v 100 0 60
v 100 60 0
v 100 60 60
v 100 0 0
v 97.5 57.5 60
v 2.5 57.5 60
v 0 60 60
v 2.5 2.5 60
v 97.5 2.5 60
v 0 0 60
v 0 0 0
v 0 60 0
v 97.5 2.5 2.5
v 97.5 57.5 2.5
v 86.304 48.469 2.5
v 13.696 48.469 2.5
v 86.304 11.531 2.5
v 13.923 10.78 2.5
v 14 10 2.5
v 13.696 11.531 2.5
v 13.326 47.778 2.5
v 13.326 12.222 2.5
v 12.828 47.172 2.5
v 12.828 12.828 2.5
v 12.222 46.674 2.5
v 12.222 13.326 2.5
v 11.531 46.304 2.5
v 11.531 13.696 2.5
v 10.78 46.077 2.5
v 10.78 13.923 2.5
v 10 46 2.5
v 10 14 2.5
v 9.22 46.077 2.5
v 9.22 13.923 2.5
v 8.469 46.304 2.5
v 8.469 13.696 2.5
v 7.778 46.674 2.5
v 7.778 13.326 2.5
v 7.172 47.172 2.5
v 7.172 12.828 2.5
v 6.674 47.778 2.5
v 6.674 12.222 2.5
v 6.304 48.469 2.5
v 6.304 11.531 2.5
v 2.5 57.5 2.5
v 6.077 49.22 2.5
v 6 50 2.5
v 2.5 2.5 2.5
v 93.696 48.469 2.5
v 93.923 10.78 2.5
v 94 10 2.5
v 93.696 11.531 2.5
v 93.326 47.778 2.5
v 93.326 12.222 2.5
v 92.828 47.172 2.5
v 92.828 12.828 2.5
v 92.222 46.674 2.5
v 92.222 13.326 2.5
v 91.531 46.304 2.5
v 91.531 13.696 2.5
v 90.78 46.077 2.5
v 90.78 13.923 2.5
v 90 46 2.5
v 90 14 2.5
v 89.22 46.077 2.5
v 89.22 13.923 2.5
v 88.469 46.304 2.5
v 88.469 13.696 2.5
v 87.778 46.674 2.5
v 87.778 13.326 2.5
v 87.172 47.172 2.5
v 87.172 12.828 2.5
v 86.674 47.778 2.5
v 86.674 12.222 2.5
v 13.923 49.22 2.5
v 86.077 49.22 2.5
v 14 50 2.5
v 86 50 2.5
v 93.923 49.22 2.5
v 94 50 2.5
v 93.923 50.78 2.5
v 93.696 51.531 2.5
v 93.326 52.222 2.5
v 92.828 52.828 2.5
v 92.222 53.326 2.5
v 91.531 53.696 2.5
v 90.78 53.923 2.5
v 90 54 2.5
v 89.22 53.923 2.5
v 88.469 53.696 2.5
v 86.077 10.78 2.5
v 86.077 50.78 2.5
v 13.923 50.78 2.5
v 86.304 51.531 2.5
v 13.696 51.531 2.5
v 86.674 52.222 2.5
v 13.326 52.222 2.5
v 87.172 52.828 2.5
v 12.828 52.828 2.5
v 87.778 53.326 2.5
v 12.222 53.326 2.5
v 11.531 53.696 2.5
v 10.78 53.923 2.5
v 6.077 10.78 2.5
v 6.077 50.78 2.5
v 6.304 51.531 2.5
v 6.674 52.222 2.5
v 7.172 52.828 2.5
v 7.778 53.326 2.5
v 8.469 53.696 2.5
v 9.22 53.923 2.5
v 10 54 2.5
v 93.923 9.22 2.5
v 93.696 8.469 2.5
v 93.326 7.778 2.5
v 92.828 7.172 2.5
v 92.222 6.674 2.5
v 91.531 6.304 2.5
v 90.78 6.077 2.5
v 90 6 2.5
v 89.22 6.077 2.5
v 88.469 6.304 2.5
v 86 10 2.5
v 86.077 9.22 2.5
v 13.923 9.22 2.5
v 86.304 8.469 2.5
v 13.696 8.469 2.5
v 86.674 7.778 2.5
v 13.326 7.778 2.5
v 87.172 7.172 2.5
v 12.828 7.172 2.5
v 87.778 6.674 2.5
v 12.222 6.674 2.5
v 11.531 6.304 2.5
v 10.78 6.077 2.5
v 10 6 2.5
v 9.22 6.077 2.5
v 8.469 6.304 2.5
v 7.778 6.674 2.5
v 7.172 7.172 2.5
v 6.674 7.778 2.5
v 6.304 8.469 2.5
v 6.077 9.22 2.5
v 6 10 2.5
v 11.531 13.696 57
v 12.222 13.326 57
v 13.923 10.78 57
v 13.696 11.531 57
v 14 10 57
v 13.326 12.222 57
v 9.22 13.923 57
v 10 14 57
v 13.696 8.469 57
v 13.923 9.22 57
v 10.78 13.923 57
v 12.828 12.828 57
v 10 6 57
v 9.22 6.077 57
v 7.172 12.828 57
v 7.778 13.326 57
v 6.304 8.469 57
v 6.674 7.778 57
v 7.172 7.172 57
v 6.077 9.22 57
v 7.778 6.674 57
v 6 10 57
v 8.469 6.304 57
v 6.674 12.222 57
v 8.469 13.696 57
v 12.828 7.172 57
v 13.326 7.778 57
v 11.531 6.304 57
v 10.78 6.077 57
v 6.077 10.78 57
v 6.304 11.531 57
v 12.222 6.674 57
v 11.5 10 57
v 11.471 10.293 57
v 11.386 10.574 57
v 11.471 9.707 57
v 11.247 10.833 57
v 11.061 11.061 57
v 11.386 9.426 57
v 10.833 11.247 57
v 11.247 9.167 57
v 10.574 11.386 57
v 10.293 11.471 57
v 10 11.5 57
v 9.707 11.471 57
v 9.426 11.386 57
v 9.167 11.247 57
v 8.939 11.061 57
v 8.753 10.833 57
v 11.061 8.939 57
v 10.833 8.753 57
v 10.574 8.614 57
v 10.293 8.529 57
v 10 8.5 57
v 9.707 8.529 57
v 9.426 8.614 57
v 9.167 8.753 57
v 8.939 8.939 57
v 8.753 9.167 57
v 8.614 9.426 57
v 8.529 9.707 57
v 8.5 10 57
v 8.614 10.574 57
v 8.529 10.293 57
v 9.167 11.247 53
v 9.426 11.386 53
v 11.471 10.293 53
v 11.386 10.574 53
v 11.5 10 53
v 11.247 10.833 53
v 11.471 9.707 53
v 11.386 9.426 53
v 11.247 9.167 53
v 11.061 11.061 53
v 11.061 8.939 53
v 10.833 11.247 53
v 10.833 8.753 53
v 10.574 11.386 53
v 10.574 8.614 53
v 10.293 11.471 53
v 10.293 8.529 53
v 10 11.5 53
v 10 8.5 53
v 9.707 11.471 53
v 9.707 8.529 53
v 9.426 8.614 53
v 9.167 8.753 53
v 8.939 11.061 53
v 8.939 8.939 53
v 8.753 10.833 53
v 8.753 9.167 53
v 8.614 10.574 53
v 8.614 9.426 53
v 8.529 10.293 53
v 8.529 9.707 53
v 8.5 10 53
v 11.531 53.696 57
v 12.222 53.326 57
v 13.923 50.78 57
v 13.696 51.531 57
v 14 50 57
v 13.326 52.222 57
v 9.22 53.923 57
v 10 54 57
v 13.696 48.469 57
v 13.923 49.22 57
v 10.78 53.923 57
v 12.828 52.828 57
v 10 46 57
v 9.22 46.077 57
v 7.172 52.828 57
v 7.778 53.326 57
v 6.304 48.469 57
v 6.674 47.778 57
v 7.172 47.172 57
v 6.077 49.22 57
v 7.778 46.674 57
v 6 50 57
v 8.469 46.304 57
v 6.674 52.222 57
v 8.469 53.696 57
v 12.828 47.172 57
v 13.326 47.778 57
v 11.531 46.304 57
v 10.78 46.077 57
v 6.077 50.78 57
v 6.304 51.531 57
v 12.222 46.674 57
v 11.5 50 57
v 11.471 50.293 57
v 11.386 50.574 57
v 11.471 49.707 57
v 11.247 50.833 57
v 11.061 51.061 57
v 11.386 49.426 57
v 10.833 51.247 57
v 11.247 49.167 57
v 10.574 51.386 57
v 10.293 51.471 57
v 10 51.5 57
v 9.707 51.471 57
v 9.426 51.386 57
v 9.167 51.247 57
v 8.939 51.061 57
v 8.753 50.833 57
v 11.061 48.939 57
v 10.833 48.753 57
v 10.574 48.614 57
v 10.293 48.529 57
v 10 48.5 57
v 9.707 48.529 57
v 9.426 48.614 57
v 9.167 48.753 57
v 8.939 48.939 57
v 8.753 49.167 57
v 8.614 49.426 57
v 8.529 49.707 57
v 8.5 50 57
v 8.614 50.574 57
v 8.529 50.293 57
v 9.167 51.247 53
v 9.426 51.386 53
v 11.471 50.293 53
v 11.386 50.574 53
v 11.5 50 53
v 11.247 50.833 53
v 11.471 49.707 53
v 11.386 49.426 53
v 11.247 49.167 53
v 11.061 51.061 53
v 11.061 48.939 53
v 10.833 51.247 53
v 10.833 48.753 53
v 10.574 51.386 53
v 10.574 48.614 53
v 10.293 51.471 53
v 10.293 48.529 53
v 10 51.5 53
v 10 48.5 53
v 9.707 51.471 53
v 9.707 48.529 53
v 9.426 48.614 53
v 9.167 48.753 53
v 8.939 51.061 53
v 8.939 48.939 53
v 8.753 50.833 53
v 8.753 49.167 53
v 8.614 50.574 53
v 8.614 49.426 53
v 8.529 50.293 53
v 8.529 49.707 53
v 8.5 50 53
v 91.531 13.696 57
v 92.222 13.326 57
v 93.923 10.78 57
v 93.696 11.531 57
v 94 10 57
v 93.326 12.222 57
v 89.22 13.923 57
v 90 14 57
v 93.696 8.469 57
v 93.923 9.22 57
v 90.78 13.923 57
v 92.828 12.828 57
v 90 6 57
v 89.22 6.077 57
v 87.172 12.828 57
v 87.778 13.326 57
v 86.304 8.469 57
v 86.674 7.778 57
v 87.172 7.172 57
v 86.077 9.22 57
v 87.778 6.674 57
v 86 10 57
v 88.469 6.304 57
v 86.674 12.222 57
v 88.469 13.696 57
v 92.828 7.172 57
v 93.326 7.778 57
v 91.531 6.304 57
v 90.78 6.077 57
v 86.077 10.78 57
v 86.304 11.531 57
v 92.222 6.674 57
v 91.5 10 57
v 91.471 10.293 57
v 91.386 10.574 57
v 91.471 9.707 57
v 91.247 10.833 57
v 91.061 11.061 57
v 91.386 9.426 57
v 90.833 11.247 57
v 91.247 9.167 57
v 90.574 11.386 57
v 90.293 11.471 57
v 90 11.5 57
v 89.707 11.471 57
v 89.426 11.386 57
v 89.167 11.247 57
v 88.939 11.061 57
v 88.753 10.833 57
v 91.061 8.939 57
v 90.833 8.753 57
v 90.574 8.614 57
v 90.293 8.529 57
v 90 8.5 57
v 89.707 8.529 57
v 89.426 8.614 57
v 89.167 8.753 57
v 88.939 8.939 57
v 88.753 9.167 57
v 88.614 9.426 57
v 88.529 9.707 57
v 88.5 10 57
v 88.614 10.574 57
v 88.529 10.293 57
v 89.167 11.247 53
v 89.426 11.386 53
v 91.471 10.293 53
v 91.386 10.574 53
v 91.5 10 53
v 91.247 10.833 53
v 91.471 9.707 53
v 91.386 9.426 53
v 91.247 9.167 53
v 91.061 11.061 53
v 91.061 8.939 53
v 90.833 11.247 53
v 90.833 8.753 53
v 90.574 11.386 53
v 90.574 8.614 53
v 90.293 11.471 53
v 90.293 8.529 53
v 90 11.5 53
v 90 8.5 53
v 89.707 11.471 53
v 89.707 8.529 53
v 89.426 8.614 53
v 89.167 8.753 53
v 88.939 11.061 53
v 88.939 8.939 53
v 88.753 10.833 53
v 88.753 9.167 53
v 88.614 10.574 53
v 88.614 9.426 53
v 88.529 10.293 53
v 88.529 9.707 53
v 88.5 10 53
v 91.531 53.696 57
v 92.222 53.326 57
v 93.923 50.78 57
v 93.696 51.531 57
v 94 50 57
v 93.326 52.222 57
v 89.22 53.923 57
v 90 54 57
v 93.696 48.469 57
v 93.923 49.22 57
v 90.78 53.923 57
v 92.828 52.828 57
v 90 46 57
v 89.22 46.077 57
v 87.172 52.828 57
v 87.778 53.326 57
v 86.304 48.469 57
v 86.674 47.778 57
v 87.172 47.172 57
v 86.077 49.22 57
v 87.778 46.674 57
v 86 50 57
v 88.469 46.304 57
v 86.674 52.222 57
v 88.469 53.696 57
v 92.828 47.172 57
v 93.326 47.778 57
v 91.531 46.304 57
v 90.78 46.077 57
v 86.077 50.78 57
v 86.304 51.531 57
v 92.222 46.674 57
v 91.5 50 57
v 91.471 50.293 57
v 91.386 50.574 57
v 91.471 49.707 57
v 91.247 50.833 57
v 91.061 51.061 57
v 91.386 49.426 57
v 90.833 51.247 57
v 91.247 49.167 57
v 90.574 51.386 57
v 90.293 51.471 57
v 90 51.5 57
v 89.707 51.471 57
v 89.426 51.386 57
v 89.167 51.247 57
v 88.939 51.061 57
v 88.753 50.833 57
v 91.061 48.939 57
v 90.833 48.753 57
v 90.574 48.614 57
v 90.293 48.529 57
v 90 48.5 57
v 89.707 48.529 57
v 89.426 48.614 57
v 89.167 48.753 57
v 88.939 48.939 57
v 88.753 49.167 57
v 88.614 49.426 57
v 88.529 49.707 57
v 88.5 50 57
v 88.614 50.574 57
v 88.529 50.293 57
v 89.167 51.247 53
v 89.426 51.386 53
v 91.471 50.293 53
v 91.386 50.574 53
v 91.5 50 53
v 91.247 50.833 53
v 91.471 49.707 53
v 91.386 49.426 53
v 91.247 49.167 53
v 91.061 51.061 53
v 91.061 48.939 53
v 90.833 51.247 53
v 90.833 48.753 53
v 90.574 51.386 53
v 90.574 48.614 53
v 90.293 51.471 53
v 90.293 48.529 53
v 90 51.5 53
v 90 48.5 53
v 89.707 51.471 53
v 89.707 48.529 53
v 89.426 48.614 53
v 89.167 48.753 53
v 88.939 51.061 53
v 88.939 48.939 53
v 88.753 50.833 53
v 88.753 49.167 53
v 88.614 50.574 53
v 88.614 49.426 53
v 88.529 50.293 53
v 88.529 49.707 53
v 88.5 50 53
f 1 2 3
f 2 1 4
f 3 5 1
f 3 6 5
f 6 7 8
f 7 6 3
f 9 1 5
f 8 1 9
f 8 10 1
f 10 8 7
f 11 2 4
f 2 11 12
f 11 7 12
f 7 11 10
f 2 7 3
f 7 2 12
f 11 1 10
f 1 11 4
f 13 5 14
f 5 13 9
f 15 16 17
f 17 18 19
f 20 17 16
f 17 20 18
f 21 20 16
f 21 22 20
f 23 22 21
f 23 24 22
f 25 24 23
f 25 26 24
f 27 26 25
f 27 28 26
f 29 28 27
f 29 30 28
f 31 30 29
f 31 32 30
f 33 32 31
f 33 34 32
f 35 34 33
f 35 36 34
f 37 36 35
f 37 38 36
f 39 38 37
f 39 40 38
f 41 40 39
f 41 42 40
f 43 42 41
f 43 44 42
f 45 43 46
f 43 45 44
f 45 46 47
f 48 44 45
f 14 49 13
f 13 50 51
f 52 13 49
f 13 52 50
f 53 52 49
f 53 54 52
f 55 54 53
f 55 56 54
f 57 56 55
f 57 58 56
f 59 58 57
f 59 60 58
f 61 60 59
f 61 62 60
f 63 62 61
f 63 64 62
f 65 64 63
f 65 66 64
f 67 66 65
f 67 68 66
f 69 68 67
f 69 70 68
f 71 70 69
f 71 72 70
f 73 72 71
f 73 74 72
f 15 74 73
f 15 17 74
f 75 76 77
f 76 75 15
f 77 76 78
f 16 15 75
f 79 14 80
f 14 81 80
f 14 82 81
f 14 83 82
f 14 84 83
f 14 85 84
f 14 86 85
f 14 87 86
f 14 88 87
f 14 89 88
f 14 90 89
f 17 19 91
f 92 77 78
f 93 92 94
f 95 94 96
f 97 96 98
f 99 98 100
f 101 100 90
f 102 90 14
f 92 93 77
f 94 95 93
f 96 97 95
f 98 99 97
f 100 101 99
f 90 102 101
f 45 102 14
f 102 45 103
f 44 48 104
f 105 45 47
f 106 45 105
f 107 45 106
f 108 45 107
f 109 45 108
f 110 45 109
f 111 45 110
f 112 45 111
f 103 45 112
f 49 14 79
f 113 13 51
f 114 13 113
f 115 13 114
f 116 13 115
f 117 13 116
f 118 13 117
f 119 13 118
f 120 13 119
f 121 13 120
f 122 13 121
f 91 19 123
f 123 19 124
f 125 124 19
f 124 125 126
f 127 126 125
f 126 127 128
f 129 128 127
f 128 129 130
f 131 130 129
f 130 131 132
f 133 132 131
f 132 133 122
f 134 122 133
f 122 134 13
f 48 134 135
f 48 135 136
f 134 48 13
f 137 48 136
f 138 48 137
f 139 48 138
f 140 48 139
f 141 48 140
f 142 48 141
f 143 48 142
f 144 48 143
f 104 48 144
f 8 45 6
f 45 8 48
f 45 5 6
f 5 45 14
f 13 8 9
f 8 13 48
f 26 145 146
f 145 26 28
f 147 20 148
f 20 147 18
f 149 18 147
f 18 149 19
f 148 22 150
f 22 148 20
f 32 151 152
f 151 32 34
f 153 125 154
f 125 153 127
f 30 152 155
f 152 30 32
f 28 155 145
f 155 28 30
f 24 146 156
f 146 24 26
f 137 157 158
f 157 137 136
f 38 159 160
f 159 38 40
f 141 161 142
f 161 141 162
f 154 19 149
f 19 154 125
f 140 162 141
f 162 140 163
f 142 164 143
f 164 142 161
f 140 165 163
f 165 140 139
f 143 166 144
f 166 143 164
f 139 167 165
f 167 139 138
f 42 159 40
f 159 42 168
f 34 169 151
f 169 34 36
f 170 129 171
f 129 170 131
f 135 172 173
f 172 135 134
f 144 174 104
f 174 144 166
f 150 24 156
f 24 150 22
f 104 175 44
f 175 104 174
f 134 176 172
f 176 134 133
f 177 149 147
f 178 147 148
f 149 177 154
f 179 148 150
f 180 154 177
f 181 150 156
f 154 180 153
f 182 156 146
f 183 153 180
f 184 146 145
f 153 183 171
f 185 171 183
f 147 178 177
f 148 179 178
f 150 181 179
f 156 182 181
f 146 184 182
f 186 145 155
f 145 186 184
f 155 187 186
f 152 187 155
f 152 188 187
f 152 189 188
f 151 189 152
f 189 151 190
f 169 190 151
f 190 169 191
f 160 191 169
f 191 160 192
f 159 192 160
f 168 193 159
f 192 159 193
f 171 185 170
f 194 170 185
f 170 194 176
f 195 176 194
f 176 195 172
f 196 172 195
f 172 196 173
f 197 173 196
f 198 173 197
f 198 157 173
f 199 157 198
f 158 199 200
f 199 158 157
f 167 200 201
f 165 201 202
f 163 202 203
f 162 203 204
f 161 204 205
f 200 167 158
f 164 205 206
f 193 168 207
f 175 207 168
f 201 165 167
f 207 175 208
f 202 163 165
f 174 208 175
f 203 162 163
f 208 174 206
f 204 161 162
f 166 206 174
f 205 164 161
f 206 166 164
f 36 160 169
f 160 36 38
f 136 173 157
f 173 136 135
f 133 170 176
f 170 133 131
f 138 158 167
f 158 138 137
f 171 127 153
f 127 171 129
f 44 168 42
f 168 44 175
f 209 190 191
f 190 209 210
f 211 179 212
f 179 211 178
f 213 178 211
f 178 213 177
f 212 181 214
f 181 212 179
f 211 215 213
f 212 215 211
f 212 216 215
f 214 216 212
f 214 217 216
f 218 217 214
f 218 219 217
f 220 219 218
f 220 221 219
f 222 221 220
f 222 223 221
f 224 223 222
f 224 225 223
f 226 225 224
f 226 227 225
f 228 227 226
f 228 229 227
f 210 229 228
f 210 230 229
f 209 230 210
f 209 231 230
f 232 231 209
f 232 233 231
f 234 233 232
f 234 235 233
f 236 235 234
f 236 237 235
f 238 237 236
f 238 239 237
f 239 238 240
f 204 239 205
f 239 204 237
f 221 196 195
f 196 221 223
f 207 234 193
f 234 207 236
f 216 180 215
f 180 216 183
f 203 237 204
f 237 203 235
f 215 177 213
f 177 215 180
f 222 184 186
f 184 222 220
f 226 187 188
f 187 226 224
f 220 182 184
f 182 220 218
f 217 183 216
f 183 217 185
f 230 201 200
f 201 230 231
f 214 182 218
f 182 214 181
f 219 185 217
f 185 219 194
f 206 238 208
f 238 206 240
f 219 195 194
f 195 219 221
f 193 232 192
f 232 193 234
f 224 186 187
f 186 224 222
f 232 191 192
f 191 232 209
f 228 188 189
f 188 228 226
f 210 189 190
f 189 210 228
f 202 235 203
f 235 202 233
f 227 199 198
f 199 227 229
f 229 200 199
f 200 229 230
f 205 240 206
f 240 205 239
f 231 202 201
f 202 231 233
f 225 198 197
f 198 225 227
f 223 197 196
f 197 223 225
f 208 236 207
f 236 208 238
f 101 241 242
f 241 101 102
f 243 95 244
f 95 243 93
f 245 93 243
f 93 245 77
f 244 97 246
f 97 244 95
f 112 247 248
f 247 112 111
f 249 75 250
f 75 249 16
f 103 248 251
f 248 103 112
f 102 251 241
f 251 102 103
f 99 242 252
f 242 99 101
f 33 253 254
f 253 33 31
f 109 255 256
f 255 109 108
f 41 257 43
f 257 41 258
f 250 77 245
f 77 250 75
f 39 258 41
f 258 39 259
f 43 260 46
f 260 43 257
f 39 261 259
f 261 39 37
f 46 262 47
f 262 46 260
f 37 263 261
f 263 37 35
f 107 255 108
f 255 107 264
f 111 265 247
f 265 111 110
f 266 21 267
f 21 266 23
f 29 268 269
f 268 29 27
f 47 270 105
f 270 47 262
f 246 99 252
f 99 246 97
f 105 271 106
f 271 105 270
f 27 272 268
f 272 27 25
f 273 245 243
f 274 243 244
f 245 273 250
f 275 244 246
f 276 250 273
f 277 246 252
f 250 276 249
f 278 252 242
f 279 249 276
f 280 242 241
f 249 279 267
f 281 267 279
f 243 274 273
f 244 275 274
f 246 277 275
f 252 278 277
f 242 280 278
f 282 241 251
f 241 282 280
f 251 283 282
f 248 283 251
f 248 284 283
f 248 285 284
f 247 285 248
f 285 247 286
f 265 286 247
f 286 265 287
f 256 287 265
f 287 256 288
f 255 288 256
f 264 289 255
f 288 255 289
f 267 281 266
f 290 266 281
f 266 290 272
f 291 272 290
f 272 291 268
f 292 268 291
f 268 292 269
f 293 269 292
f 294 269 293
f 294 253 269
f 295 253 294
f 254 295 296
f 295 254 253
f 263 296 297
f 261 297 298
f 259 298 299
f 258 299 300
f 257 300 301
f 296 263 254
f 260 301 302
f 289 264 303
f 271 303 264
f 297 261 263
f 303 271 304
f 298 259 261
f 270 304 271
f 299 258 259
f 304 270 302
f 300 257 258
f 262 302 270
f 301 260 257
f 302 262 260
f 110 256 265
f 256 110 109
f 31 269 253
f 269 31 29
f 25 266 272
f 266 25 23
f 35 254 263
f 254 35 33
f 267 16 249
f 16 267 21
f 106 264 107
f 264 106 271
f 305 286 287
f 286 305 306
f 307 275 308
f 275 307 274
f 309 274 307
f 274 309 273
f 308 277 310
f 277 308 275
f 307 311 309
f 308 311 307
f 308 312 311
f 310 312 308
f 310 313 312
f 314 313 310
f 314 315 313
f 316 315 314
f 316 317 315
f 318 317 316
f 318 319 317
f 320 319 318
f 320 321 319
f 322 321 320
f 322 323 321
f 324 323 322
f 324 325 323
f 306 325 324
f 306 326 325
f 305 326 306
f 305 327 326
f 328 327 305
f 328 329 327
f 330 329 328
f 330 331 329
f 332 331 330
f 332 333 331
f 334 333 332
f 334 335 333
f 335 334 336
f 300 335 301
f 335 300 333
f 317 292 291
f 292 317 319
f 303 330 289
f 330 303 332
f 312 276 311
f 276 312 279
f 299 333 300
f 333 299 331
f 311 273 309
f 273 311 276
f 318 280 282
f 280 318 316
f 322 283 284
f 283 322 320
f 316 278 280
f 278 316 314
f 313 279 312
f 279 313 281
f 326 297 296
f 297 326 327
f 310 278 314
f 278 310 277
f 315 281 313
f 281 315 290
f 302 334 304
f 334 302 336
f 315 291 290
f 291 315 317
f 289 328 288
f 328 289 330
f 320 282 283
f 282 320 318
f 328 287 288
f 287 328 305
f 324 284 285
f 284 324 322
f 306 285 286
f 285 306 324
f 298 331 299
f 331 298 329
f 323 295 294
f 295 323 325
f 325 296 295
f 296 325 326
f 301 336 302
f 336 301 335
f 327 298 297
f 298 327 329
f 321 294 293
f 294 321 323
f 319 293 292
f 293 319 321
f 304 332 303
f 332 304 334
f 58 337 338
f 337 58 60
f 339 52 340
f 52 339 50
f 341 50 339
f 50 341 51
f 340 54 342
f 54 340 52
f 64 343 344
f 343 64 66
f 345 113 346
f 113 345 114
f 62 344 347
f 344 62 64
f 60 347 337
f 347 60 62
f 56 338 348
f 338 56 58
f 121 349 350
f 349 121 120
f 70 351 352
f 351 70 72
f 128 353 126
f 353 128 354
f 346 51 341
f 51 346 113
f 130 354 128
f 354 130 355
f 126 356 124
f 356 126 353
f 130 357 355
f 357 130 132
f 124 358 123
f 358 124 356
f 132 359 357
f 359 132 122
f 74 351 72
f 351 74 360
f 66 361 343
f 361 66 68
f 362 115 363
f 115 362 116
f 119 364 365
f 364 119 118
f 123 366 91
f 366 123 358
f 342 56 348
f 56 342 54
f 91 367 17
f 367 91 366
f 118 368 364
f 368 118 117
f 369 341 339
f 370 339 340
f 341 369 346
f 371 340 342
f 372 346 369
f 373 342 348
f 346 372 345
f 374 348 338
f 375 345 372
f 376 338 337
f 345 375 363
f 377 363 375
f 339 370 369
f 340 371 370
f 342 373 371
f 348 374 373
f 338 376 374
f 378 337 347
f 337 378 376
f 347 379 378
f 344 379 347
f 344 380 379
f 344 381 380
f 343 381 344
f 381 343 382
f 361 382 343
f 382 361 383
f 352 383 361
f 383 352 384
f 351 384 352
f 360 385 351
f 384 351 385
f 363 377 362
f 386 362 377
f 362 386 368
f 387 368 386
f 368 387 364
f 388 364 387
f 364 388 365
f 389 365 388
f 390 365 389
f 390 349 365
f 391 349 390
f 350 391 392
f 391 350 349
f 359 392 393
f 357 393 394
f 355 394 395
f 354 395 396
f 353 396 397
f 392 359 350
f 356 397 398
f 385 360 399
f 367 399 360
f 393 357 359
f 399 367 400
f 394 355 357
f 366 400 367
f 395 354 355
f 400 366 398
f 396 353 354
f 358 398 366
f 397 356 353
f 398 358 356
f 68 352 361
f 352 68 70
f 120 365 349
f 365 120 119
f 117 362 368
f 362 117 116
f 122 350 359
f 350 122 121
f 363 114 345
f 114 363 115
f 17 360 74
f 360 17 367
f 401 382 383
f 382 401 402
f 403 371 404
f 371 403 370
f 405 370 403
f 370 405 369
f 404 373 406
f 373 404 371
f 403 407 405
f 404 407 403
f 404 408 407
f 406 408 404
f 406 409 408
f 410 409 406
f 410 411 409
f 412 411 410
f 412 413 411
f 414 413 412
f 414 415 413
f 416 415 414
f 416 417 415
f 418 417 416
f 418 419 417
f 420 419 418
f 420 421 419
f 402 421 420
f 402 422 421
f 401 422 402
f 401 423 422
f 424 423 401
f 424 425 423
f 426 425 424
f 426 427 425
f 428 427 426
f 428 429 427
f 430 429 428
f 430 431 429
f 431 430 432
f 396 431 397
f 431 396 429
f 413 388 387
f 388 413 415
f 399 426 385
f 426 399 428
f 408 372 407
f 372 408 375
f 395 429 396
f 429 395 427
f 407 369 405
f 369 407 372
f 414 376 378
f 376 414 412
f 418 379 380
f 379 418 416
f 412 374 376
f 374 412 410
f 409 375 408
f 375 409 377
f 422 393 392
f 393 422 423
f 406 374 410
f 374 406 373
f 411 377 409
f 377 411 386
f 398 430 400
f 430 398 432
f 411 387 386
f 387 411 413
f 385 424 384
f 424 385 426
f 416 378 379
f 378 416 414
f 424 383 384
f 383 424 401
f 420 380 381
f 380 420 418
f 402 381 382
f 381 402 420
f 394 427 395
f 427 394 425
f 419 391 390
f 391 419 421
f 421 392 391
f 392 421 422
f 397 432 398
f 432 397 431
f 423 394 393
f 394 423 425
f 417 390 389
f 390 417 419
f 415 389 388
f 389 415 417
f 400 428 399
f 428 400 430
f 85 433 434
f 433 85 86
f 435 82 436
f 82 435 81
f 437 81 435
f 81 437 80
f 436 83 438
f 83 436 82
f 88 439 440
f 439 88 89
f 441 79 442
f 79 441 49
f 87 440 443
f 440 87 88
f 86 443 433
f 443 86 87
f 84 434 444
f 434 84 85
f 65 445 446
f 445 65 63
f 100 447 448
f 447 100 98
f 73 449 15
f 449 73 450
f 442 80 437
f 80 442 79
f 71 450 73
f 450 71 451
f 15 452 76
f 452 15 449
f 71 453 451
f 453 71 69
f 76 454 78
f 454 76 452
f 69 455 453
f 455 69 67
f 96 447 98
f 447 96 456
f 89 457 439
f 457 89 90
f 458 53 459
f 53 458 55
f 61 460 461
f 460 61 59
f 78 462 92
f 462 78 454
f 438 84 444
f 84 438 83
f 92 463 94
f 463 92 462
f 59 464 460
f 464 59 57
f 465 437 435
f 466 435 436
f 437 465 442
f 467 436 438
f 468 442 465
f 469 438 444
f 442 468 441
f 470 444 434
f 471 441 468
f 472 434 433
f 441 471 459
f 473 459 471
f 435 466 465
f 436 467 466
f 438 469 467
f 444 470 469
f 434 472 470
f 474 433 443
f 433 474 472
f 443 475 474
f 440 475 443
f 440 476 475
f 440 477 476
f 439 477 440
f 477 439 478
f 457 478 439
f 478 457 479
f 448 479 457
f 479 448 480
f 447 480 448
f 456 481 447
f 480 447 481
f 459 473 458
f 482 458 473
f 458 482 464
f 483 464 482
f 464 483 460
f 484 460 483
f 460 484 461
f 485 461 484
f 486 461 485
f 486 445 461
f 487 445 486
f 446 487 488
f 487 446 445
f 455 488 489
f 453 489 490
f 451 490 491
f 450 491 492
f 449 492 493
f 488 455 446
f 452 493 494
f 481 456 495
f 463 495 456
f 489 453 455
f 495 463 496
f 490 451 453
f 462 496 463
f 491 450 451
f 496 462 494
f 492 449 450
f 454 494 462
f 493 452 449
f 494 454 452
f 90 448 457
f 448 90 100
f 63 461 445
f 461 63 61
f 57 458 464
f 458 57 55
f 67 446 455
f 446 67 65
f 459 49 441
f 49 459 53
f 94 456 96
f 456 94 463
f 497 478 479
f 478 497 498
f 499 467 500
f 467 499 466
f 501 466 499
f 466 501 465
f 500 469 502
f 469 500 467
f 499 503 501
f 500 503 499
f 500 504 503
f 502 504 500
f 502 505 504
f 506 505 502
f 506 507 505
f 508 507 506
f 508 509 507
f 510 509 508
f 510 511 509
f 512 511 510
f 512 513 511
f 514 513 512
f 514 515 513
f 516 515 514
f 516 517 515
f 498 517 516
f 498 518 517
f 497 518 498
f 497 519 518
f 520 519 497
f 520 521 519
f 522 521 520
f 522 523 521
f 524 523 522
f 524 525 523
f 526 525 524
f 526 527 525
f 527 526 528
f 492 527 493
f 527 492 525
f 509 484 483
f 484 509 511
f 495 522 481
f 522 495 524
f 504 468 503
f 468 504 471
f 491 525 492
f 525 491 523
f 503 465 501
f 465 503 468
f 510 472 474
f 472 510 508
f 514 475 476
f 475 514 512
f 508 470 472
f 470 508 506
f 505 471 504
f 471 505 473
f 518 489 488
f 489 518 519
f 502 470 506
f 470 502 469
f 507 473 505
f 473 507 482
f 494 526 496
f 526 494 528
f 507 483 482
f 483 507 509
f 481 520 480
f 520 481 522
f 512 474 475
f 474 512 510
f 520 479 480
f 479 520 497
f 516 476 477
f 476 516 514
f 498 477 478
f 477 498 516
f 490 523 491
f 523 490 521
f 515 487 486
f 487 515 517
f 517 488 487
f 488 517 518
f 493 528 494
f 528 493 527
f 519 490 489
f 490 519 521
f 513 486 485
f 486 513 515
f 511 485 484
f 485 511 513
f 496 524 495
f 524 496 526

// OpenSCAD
$fn = 32;

// ----------------------------------------------------------------------
// Enclosure box: bosses enclosure
// ----------------------------------------------------------------------

// --- parameters (mm) ---
box_l = 100;              // outer length, X
box_w = 60;               // outer width, Y
box_h = 60;               // outer height
wall_t = 2.5;             // wall thickness
boss_r = 4;               // corner boss radius
hole_r = 1.5;             // boss screw hole radius
boss_in = 10;             // boss inset from the corners

inner_h = box_h - wall_t;  // cavity depth
boss_h = inner_h - 2;  // corner boss height

difference() {
  union() {
    difference() {
      cube([box_l, box_w, box_h]);
      translate([wall_t, wall_t, wall_t])
        cube([box_l - 2 * wall_t, box_w - 2 * wall_t, box_h]);
    }
    for (sx = [0, 1], sy = [0, 1])
      translate([sx ? box_l - boss_in : boss_in,
                 sy ? box_w - boss_in : boss_in, wall_t - 1])
        difference() {
          cylinder(r = boss_r, h = boss_h);
          translate([0, 0, boss_h - 4])
            cylinder(r = hole_r, h = 5);
        }
  }
}
